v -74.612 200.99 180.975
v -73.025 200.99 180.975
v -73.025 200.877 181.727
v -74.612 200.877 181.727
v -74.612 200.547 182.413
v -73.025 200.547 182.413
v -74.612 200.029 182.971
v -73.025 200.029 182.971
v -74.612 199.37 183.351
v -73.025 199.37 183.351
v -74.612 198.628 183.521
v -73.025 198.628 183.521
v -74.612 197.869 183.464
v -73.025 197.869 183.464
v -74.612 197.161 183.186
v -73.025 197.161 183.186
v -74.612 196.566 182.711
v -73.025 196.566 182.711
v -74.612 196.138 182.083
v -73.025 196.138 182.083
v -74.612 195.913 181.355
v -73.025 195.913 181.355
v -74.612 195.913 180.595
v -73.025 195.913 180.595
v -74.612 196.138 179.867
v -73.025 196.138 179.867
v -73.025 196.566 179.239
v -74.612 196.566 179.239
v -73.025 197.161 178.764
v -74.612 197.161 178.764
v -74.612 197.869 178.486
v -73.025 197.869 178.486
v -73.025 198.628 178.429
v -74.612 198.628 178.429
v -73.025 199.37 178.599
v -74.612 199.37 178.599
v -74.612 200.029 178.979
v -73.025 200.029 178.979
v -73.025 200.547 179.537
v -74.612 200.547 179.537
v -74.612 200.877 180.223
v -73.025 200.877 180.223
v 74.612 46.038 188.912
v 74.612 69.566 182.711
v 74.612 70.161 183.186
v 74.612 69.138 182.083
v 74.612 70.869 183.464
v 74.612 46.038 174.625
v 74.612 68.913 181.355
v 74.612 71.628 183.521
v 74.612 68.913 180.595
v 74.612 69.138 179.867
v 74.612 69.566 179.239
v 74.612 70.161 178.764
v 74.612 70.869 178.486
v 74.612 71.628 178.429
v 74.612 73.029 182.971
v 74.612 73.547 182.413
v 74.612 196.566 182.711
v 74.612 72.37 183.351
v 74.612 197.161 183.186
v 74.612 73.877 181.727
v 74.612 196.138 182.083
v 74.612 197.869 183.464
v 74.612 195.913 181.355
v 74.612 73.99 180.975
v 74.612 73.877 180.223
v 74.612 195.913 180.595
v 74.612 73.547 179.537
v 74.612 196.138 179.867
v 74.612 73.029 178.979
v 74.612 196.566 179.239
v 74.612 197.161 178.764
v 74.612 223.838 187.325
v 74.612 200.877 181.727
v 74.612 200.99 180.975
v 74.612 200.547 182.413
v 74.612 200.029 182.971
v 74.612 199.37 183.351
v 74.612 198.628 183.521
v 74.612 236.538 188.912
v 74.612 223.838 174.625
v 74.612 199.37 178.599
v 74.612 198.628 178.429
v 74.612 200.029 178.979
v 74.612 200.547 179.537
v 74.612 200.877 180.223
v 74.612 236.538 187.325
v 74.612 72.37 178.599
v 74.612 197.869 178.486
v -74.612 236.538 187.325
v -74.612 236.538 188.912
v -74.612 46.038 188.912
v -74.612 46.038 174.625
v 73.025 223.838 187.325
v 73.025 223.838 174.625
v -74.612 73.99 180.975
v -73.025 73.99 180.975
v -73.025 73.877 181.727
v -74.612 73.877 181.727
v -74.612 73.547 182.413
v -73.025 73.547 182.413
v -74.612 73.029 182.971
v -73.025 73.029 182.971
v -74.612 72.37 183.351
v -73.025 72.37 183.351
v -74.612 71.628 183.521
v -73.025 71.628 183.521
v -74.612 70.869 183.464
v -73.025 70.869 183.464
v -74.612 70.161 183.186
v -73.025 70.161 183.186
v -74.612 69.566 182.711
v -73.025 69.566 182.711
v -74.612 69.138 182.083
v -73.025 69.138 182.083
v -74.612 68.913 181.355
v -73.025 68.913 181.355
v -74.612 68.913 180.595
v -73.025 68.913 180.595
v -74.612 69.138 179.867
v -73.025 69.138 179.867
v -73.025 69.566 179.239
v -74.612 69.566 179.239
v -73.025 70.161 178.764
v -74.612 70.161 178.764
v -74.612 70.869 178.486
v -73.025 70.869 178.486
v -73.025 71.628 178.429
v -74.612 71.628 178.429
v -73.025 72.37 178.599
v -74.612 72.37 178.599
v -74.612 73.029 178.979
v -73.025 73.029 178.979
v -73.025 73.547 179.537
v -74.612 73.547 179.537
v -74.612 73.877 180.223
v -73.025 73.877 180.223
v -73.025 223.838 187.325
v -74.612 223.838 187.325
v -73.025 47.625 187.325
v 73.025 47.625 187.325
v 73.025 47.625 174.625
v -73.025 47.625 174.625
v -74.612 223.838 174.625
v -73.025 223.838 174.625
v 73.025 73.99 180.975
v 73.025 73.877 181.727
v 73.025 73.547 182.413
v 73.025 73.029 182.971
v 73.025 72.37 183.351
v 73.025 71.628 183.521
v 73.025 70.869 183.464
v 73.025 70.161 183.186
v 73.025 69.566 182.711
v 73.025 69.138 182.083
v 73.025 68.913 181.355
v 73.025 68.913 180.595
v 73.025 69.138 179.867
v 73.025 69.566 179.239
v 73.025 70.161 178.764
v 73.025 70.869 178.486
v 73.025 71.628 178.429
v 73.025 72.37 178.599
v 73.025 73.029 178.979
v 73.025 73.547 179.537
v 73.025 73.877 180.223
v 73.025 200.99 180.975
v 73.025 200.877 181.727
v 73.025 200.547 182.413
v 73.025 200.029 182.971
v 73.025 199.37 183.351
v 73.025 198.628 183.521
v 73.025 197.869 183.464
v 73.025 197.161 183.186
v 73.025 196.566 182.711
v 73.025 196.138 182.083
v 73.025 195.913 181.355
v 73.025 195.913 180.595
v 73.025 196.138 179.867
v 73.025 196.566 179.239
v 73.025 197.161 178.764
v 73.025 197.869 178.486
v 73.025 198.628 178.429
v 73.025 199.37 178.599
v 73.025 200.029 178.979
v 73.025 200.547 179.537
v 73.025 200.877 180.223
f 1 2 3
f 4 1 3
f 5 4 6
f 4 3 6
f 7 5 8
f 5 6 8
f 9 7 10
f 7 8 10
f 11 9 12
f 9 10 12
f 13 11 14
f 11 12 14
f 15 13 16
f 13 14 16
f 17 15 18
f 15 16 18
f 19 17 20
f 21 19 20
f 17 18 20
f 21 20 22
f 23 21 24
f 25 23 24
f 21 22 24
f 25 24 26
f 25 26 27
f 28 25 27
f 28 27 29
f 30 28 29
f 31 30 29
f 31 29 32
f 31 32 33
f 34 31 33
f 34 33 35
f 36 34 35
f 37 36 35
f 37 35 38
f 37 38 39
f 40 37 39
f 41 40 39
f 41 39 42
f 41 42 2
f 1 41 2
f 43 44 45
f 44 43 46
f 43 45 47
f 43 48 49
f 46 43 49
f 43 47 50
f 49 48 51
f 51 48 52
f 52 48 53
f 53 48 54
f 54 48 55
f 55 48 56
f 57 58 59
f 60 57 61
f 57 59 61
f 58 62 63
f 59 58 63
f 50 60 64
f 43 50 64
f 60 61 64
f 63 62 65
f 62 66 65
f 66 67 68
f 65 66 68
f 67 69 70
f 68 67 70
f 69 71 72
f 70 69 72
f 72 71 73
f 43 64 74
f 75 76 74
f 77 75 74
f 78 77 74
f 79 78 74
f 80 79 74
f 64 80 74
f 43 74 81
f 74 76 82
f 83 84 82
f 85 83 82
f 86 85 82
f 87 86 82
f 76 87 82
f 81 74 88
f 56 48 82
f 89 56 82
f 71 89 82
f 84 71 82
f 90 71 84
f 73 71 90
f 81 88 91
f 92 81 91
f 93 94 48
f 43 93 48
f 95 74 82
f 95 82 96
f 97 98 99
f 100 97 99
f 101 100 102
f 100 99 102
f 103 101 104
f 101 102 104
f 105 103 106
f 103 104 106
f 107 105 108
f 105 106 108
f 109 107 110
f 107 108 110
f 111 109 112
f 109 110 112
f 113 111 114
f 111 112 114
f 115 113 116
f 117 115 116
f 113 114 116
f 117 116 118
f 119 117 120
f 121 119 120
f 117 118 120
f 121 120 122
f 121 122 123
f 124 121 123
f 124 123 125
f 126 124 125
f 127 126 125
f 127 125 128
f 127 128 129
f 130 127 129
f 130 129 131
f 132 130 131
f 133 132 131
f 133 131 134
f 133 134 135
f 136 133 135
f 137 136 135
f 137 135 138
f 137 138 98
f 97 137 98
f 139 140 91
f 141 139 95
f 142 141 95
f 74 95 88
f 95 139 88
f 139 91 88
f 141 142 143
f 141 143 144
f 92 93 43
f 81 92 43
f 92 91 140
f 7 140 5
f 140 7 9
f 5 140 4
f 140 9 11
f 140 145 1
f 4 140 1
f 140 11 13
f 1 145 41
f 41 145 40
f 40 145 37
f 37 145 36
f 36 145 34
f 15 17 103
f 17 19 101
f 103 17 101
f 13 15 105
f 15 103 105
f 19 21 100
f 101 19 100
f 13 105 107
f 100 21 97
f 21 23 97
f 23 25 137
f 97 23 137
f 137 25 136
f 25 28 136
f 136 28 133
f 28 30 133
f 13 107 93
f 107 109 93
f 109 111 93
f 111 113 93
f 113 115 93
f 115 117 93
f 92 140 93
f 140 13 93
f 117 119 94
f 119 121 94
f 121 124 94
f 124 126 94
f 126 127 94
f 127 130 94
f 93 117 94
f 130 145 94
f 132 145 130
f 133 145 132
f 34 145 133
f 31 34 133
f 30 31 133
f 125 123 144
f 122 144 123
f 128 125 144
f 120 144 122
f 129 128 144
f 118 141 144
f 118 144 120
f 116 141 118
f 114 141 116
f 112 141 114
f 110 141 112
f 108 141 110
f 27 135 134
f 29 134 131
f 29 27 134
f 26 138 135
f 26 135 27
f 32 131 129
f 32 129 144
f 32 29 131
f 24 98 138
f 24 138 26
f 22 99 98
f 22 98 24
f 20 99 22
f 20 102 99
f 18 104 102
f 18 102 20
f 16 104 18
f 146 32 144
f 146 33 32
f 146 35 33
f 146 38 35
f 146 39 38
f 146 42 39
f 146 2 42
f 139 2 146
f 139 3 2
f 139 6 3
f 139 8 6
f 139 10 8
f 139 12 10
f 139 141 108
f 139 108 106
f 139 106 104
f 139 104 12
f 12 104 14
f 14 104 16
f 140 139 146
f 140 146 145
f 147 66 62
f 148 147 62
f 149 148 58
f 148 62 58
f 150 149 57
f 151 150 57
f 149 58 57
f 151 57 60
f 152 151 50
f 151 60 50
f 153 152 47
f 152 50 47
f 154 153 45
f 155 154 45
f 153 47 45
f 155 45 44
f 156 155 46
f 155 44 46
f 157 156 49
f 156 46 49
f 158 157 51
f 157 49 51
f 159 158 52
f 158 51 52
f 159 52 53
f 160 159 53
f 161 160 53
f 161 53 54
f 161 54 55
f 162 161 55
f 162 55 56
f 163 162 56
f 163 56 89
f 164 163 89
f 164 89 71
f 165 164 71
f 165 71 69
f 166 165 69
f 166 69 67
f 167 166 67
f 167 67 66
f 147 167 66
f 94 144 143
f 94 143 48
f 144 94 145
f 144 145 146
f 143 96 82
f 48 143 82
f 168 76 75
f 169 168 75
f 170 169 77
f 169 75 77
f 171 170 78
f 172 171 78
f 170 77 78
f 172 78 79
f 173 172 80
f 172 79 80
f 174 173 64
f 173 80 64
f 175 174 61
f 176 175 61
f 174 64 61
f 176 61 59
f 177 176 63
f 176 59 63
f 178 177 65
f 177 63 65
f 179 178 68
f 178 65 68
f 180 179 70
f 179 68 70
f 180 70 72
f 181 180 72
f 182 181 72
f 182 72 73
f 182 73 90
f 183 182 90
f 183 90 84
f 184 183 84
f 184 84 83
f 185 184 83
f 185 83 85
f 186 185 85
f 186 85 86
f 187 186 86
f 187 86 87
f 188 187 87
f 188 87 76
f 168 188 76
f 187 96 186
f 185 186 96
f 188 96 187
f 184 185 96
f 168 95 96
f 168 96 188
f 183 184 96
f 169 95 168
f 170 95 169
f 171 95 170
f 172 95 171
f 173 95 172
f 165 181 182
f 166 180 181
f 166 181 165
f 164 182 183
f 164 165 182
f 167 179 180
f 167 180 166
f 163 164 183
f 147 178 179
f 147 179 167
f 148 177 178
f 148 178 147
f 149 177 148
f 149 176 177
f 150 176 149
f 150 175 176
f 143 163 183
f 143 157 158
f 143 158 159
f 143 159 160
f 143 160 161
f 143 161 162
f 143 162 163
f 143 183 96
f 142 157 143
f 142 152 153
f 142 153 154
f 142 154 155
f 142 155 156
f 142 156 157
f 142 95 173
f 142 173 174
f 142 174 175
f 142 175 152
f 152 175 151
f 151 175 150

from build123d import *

# Parameters (mm, degrees)
F3_DEPTH = 12.7
F5_DEPTH = 1.5875
F6_R     = 2.5527
F7_DEPTH = 149.226


with BuildPart() as f3:
    # F2 (on offset) → F3 (new body)
    with BuildSketch(Plane.XY.offset(187.325)):
        Polygon((-73.025, 47.625), (-73.025, 223.8375), (-74.6125, 223.8375), (-74.6125, 46.0375), (74.6125, 46.0375), (74.6125, 223.8375), (73.025, 223.8375), (73.025, 47.625), align=None)
    extrude(amount=-F3_DEPTH)

    # F4 (on face) → F5 (join)
    with BuildSketch(Plane.XY.offset(187.325)):
        Polygon((-74.6125, 46.0375), (74.6125, 46.0375), (74.6125, 223.8375), (74.6125, 236.5375), (-74.6125, 236.5375), (-74.6125, 223.8375), align=None)
    extrude(amount=F5_DEPTH)

    # F6 (on face) → F7 (cut, through all)
    with BuildSketch(Plane.YZ.offset(74.6125)):
        with Locations((71.4375, 180.975)):
            Circle(F6_R)
        with Locations((198.4375, 180.975)):
            Circle(F6_R)
    extrude(amount=-F7_DEPTH, mode=Mode.SUBTRACT)


solid = f3.part
